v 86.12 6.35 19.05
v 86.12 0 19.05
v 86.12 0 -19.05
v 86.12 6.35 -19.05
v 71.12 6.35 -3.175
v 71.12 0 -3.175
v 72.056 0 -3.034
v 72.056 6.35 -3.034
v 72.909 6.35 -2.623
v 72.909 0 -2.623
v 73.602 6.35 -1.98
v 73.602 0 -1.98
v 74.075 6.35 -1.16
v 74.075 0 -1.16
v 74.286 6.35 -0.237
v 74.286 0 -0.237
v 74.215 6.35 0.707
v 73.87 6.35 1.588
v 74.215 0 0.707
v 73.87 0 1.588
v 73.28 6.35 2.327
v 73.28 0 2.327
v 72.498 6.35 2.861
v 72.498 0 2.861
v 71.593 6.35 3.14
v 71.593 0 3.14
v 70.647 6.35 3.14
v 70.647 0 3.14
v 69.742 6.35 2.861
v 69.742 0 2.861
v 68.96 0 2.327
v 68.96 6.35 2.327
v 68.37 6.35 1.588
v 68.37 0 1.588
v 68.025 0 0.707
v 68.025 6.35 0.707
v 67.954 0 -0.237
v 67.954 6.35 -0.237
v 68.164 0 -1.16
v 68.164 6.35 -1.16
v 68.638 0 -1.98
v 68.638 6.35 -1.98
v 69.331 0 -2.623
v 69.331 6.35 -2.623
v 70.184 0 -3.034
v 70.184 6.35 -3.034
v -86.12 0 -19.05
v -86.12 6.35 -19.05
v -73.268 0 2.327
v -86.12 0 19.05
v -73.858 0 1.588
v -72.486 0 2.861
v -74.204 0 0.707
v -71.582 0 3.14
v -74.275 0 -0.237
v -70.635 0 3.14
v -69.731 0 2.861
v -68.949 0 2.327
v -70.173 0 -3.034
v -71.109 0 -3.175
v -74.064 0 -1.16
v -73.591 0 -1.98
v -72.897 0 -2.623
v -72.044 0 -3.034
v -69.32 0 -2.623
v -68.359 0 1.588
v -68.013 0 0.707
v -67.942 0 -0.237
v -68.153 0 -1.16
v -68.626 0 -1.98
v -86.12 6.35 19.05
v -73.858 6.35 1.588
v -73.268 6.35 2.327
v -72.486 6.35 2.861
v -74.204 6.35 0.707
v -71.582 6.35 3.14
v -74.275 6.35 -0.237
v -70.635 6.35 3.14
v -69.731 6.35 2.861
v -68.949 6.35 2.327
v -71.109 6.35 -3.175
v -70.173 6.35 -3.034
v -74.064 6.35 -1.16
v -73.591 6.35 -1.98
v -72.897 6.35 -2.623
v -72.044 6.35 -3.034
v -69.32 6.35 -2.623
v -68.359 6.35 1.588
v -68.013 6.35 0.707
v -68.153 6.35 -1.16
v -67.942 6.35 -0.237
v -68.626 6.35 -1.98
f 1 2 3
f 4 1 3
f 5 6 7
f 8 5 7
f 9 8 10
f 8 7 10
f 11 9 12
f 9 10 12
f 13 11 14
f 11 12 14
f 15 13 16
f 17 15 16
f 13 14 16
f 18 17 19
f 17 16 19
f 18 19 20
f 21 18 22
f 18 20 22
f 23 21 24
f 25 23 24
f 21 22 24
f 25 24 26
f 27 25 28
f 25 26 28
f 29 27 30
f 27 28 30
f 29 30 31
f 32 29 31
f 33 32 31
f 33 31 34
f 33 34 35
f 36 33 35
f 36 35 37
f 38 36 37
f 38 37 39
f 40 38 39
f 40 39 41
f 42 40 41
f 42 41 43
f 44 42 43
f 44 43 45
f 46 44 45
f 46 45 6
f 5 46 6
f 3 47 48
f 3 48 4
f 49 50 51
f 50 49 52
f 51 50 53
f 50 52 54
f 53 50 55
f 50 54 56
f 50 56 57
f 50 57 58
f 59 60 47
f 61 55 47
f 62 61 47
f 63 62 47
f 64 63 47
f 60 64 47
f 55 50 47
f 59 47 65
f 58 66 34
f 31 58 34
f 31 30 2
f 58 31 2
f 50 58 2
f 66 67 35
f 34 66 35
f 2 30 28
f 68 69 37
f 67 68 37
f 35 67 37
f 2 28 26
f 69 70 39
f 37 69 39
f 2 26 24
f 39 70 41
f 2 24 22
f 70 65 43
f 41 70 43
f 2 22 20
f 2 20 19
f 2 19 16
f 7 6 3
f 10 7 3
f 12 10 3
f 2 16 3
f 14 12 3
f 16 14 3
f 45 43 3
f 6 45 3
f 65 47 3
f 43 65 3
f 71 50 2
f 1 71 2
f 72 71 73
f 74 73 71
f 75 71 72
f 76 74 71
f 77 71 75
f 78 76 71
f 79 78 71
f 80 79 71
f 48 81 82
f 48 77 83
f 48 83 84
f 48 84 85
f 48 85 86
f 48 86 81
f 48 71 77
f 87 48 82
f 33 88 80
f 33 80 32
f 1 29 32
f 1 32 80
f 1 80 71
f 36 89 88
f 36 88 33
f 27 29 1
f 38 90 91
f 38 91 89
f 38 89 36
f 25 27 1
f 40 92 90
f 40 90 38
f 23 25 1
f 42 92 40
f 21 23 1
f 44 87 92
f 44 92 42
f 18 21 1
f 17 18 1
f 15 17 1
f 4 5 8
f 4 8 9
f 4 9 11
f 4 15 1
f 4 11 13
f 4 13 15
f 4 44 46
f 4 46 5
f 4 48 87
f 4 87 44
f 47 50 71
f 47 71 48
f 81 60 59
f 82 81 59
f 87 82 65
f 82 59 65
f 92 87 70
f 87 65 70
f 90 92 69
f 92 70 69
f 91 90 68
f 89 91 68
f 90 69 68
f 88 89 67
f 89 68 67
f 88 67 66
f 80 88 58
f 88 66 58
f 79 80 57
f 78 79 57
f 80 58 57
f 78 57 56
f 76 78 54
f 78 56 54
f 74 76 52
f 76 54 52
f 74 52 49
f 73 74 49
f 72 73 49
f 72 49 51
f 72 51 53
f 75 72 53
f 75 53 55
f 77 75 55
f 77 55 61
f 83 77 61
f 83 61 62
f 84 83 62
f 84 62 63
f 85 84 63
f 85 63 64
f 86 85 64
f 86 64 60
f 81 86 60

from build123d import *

# Parameters (mm, degrees)
SKETCH1_W           = 172.23994
SKETCH1_H           = 38.1
BOSS_EXTRUDE1_DEPTH = 6.35
CUT_EXTRUDE1_REACH  = 90.43
SKETCH2_R           = 3.175


with BuildPart() as part:
    # Sketch1 → Boss-Extrude1 (new body)
    with BuildSketch(Plane(origin=(0, 0, 0), x_dir=(1, 0, 0), z_dir=(0, 1, 0))):
        Rectangle(SKETCH1_W, SKETCH1_H)
    extrude(amount=BOSS_EXTRUDE1_DEPTH)

    # Sketch2 → Cut-Extrude1 (cut, up to next)
    with BuildSketch(Plane.XZ, mode=Mode.PRIVATE) as cut_extrude1_sk1:
        with Locations(Location((-71.10857, 0, 0), (0, 0, 270))):
            Circle(SKETCH2_R)
    cut_extrude1_tool1 = extrude(cut_extrude1_sk1.sketch, amount=-CUT_EXTRUDE1_REACH, mode=Mode.PRIVATE) & part.part
    # Sketch2 → Cut-Extrude1 (cut, up to next)
    with BuildSketch(Plane.XZ, mode=Mode.PRIVATE) as cut_extrude1_sk2:
        with Locations(Location((71.11997, 0, 0), (0, 0, 270))):
            Circle(SKETCH2_R)
    cut_extrude1_tool2 = extrude(cut_extrude1_sk2.sketch, amount=-CUT_EXTRUDE1_REACH, mode=Mode.PRIVATE) & part.part
    add(cut_extrude1_tool1.solids().sort_by_distance((-71.10857, 0, 0))[0], mode=Mode.SUBTRACT)
    add(cut_extrude1_tool2.solids().sort_by_distance((71.11997, 0, 0))[0], mode=Mode.SUBTRACT)


solid = part.part
